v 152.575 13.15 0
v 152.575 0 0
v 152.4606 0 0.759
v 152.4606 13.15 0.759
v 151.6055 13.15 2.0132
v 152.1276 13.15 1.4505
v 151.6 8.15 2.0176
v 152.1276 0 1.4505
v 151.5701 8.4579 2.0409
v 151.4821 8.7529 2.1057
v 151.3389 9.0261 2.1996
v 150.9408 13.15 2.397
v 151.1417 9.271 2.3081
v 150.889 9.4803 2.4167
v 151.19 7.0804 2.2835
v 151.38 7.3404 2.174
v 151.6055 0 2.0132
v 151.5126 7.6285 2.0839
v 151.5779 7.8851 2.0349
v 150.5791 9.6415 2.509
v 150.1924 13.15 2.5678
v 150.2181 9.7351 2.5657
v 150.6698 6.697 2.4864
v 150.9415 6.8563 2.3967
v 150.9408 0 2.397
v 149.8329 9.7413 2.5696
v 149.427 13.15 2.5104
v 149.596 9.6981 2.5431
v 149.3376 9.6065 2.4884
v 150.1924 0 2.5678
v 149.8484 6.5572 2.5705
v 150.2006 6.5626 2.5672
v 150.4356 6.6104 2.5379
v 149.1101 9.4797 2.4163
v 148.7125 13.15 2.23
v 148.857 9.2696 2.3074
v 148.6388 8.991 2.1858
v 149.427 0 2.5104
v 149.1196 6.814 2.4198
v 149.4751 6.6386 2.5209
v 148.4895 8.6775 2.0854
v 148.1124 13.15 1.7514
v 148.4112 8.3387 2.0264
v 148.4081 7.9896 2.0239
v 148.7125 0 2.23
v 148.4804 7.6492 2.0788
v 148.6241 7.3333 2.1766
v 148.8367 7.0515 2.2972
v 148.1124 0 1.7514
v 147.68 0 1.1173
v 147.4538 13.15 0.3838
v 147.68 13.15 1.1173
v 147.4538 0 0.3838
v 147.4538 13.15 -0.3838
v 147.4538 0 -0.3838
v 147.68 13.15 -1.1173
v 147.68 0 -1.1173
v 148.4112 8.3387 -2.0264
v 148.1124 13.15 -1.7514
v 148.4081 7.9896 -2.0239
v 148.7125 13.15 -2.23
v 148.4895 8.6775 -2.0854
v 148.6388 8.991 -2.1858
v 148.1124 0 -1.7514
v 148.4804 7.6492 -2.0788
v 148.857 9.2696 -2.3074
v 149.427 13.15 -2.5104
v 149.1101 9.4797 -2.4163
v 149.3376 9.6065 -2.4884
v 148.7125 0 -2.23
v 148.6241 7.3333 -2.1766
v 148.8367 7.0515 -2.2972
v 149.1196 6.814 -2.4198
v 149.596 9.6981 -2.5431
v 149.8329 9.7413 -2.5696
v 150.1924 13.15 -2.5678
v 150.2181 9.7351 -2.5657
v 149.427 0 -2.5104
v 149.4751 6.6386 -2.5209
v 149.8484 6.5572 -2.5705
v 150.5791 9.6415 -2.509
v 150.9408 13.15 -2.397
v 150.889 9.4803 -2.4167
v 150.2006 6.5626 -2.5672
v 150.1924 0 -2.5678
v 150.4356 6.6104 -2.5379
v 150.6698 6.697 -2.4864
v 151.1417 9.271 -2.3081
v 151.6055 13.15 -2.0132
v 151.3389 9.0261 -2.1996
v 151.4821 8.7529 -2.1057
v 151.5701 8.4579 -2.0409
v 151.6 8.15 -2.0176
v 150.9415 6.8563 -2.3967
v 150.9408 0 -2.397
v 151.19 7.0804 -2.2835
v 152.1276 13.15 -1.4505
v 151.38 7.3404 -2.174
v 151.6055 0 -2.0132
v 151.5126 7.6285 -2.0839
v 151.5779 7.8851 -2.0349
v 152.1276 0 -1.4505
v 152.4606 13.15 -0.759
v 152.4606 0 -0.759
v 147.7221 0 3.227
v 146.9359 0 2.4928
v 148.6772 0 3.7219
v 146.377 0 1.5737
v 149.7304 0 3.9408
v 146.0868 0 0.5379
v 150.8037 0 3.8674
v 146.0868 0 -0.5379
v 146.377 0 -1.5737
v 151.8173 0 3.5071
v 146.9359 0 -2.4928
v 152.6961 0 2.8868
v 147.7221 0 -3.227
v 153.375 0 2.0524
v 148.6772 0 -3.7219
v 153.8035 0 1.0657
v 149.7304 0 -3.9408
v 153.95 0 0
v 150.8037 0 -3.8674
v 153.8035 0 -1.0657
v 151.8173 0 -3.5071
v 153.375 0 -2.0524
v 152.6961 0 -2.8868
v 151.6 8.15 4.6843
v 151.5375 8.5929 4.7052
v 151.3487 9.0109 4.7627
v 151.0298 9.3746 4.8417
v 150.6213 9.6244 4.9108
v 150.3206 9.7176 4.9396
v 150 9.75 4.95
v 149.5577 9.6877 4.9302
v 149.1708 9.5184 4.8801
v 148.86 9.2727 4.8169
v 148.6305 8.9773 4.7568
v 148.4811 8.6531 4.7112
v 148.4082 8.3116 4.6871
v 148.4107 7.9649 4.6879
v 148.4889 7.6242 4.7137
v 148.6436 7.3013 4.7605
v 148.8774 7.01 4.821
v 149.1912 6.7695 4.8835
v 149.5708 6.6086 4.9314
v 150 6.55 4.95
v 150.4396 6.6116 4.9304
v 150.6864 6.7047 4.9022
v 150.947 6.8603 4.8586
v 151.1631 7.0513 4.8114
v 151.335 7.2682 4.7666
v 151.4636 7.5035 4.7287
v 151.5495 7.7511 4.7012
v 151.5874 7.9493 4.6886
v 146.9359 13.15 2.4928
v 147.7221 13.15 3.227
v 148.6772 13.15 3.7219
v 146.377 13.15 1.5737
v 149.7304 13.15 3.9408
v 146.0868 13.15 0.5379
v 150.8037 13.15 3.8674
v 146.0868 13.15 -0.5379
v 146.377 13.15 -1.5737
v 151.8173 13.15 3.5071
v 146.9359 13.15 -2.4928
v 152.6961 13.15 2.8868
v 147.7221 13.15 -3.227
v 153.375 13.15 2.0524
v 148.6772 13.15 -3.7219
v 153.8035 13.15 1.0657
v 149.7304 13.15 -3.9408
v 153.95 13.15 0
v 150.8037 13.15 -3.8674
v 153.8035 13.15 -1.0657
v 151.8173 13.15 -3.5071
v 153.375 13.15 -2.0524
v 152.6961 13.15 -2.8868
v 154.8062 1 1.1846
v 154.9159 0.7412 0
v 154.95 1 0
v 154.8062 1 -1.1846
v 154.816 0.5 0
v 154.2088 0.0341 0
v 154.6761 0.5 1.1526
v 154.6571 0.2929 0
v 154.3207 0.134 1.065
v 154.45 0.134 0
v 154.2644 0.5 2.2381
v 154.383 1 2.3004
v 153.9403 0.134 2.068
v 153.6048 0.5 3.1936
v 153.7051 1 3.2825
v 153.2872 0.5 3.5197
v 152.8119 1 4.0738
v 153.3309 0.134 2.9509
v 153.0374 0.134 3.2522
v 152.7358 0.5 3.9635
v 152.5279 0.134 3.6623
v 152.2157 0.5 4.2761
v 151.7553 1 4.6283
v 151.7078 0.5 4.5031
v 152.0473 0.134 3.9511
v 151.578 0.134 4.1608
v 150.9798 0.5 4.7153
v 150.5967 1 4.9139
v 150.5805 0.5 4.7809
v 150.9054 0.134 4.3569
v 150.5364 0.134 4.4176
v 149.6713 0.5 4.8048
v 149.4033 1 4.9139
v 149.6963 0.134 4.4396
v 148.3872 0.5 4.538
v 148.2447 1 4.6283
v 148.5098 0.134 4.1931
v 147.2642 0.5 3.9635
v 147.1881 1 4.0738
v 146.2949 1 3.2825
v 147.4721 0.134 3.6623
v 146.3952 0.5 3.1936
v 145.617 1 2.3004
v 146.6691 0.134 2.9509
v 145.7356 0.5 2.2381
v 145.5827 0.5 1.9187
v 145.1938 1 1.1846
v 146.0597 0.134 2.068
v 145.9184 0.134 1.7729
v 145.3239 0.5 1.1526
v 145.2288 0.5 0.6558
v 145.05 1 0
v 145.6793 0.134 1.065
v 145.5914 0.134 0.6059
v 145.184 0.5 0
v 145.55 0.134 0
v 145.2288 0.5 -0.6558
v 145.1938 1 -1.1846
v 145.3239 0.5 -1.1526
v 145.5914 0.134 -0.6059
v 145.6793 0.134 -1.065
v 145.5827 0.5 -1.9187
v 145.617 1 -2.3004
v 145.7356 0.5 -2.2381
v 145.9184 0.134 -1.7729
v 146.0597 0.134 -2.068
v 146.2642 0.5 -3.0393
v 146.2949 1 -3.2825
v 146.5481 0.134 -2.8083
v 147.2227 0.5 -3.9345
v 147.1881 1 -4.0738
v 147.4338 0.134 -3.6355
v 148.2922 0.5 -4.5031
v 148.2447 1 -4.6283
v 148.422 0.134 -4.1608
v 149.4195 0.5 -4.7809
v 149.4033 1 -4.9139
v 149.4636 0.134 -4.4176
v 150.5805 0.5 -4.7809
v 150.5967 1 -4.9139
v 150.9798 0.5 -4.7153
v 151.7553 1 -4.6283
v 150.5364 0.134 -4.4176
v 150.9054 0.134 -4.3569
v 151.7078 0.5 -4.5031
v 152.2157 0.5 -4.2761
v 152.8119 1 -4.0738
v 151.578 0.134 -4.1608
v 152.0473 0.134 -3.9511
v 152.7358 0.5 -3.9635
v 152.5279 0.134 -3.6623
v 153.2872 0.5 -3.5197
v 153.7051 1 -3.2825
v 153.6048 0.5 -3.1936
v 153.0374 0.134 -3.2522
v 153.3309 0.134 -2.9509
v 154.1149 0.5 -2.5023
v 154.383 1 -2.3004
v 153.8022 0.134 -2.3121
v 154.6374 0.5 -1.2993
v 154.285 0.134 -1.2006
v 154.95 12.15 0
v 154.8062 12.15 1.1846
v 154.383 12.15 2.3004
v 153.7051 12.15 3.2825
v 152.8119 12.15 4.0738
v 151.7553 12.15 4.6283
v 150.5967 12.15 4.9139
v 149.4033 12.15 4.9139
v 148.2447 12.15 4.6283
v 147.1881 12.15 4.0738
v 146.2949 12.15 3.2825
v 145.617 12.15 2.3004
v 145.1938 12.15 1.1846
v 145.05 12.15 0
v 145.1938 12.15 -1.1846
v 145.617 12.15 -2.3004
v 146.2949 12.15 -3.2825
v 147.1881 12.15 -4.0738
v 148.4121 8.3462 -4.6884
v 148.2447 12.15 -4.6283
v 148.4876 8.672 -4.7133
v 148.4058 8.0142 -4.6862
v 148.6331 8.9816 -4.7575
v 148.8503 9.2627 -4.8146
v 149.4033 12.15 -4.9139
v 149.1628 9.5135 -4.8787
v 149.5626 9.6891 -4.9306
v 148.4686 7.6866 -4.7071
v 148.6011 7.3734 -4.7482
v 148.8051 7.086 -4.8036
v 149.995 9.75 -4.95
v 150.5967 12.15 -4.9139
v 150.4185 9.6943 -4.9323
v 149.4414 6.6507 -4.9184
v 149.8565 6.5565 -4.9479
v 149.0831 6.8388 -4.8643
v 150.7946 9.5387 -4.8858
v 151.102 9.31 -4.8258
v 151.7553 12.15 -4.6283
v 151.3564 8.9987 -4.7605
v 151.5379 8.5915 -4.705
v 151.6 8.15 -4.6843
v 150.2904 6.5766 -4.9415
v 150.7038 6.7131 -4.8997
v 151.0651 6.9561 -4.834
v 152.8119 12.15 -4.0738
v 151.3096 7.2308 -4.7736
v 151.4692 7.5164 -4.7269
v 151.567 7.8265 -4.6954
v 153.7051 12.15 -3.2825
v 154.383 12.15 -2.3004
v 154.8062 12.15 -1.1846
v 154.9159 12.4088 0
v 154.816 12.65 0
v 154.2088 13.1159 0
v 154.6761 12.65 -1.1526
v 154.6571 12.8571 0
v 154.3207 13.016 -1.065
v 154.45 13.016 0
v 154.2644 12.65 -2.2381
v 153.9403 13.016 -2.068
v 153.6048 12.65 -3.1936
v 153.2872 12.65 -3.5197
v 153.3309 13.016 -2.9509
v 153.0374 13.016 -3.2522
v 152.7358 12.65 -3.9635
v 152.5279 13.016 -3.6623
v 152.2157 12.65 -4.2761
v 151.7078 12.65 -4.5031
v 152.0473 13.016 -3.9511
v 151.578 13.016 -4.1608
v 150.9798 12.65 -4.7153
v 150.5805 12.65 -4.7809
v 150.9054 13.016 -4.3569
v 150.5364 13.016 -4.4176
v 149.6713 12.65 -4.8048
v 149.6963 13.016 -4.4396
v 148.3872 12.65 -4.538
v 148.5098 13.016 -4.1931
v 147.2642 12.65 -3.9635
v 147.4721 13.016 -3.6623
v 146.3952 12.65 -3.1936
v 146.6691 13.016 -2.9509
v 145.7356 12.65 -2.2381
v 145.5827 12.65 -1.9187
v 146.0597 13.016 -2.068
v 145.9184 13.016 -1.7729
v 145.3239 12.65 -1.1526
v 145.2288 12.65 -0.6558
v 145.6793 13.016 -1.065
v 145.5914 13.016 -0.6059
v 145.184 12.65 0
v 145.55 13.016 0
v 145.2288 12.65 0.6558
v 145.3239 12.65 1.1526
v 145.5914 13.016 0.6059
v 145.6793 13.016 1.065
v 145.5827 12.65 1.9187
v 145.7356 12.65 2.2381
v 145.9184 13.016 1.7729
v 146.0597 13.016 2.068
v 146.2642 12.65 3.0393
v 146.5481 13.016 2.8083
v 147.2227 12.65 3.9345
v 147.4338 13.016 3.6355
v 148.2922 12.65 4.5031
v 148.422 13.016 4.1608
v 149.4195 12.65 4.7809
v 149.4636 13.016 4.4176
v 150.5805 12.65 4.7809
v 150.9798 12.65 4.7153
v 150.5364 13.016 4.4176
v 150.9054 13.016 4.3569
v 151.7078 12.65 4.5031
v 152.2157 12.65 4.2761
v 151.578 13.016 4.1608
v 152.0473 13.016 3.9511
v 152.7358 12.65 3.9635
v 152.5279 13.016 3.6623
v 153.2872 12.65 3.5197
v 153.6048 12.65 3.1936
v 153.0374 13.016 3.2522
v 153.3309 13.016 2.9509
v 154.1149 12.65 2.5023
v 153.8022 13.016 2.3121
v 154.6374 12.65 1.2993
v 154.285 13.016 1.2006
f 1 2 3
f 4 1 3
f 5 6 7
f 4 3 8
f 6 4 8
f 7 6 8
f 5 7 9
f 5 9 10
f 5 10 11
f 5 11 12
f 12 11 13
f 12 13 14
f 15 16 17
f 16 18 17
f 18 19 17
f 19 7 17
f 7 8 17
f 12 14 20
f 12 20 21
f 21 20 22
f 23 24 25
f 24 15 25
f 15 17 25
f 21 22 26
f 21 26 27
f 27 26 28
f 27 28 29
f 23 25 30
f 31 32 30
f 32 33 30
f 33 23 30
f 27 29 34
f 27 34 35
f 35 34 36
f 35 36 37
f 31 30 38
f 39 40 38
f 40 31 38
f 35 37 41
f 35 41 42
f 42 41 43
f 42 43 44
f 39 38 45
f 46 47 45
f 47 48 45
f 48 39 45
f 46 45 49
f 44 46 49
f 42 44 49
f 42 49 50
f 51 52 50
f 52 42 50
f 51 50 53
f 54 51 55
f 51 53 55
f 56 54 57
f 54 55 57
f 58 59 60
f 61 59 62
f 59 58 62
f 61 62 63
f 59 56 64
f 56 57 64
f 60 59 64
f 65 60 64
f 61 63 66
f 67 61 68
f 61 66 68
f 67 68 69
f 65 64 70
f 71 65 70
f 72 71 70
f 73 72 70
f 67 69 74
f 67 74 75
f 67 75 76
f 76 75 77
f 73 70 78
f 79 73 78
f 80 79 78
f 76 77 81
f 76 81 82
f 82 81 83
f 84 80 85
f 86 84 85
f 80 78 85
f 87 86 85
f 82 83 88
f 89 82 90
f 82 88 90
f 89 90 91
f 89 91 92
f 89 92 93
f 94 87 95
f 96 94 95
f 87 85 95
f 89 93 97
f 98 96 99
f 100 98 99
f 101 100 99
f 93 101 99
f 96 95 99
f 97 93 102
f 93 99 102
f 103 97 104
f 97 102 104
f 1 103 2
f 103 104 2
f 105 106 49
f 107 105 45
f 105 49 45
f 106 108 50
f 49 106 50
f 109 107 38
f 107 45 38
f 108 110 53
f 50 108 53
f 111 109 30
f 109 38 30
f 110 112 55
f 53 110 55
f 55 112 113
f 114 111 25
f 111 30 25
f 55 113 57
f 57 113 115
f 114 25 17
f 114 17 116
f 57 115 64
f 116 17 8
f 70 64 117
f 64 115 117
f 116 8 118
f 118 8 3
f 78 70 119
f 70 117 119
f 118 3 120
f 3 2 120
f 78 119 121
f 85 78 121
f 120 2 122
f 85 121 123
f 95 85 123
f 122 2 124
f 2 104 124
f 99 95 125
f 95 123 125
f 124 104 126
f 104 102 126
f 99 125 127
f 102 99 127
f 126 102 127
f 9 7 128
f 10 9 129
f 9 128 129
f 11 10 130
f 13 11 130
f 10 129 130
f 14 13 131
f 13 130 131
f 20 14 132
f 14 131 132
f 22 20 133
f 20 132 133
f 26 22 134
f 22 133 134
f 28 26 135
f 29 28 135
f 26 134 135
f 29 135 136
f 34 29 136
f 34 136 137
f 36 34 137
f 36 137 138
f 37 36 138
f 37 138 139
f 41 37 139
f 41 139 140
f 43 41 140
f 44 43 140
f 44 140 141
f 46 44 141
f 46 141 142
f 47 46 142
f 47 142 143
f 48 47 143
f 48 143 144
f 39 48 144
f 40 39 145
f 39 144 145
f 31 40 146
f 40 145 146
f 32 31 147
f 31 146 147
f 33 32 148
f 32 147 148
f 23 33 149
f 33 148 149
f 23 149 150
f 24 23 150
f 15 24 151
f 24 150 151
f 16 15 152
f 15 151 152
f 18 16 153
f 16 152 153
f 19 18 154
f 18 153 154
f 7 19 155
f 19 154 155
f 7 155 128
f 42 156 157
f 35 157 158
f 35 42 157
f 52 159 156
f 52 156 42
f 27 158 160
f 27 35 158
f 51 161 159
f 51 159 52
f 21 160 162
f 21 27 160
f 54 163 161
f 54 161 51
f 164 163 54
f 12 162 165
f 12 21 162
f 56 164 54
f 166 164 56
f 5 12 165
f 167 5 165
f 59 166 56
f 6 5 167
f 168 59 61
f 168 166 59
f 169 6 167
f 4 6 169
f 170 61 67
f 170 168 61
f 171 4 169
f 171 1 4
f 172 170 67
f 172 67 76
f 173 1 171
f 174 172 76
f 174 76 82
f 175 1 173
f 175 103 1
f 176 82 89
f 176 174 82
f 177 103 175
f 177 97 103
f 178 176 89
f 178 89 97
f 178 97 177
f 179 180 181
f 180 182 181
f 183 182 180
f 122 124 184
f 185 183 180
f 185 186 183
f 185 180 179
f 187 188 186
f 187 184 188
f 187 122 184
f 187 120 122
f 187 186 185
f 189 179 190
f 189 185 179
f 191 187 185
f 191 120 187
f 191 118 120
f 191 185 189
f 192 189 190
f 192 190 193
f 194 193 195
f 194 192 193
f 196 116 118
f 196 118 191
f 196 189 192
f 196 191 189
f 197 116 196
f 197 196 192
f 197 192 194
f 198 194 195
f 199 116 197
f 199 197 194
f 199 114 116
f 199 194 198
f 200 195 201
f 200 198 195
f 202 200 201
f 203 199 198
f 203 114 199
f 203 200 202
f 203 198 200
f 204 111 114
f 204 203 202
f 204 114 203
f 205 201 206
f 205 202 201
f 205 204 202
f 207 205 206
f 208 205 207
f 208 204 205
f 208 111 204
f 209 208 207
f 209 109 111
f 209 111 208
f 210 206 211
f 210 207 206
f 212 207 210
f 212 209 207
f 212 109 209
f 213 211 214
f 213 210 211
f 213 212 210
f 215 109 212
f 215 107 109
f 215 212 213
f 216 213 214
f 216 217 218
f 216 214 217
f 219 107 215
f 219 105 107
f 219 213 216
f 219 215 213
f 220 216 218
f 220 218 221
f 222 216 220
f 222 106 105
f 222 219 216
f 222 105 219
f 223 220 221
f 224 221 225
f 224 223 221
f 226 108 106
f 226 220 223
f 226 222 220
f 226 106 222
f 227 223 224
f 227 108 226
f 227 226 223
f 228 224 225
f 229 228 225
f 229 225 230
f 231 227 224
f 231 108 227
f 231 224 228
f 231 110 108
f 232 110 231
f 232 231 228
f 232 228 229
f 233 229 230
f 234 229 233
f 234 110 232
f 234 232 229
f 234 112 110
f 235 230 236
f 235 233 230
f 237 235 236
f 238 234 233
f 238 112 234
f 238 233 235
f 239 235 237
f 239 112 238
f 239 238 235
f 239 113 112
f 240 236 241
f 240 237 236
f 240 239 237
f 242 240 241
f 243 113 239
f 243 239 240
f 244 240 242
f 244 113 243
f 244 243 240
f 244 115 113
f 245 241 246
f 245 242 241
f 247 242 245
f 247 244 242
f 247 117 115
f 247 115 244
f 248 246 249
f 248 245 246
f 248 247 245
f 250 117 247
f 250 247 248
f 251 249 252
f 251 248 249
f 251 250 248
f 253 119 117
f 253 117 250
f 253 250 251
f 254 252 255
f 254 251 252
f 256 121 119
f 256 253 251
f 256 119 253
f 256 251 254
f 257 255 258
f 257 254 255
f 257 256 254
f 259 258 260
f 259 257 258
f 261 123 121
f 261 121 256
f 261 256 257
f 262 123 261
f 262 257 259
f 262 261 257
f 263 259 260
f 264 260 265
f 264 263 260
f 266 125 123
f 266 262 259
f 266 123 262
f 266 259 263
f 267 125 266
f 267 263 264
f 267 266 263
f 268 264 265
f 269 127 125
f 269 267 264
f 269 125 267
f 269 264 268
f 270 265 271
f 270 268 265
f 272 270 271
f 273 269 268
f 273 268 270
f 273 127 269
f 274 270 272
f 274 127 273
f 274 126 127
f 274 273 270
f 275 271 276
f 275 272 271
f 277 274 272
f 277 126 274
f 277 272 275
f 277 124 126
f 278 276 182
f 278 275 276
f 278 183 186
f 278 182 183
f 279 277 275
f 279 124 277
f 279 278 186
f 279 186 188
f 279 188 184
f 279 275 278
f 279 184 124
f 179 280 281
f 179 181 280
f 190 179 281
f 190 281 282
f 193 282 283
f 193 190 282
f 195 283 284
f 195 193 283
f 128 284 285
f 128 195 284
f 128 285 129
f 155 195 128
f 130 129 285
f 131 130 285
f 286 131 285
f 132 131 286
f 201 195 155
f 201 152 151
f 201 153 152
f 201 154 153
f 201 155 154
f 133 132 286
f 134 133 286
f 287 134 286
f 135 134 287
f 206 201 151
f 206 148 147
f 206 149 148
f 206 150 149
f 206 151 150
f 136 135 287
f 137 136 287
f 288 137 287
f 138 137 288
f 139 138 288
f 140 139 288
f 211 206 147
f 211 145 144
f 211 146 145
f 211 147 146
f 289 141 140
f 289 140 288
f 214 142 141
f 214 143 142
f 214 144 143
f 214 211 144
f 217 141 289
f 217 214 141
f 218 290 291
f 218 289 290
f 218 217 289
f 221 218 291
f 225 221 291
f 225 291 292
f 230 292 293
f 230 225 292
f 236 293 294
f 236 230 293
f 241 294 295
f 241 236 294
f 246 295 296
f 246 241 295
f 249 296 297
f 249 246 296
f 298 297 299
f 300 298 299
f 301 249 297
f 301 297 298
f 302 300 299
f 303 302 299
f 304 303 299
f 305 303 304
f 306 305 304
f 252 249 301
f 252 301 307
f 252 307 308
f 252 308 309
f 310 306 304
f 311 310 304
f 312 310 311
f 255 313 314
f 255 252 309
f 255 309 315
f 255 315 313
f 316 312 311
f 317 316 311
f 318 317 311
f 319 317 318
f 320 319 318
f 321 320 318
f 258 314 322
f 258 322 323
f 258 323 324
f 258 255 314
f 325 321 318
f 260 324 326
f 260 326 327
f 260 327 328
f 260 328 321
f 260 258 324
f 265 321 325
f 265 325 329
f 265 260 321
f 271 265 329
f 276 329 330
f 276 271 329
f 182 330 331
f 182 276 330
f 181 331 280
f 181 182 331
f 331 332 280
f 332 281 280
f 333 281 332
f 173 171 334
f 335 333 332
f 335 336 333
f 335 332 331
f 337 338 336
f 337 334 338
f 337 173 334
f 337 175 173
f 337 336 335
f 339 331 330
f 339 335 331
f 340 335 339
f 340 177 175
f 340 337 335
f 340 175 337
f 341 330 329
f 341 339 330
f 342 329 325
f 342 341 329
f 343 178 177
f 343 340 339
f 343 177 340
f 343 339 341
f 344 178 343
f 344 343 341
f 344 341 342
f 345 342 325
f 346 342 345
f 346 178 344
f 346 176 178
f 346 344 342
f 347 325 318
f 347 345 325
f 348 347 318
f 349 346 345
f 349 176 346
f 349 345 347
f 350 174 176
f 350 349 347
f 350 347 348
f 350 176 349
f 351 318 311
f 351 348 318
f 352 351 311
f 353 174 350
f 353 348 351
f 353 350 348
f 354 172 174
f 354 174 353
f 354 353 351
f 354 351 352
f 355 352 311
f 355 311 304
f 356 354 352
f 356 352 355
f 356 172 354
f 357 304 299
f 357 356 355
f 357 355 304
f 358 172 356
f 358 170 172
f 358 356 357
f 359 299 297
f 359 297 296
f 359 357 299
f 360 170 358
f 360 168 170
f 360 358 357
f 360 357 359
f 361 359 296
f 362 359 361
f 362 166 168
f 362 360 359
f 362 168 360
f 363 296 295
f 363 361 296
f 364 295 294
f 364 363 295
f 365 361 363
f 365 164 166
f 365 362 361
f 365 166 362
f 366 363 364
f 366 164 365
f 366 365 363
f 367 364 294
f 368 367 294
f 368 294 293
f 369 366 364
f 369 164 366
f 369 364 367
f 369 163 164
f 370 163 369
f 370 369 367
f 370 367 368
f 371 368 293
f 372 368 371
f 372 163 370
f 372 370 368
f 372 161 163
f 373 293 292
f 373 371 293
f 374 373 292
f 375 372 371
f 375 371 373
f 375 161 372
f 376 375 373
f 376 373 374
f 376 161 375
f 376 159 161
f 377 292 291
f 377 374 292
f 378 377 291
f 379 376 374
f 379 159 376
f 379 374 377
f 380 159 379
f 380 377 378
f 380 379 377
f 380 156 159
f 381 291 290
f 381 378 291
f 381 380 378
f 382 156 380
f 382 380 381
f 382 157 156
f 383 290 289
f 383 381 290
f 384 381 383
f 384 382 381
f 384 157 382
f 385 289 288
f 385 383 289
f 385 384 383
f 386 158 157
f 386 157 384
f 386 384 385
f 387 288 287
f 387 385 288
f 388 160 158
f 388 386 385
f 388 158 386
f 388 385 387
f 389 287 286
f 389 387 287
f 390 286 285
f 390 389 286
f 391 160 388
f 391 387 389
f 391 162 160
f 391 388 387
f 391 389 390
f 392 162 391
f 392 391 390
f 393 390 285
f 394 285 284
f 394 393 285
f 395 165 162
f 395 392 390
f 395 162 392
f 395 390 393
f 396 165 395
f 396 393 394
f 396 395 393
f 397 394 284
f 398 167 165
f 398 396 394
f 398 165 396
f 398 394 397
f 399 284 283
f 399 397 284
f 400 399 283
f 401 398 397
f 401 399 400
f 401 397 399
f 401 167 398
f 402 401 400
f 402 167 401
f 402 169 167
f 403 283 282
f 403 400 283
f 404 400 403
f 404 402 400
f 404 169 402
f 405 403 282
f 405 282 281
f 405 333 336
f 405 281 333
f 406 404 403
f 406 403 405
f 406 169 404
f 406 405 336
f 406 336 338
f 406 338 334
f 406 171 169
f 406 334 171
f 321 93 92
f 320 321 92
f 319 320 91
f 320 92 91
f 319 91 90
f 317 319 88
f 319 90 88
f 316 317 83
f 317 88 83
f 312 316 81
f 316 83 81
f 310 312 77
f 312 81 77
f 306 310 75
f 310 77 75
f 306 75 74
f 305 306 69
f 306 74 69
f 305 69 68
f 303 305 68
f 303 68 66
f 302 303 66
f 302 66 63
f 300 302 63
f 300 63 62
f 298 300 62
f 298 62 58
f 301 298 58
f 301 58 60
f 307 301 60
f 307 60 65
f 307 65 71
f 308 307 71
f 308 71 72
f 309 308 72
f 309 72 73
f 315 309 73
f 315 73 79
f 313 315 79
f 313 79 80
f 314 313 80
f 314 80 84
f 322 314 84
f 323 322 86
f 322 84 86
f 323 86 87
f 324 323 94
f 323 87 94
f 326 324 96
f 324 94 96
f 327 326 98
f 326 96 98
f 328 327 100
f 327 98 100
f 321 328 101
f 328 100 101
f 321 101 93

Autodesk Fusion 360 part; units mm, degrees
sketch "Sketch1" plane through (0, 0, 0) normal (0, 1, 0) x (1, 0, 0)
  circle A0 centre (150, 0) radius 4.95
  circle A1 centre (150, 0) radius 2.575
  dimension "d1" = 9.9
  dimension "d2" = 5.15
extrude "Extrude1" add sketch "Sketch1" along normal blind 13.15
ref_plane "WorkPlane1" through (150, 7.9424, 4.95) normal (0, 0, 1) x (-1, 0, 0)
sketch "Sketch2" plane through (0, 0, 4.95) normal (0, 0, 1) x (1, 0, 0)
  line L0 (154.95, 13.15) -> (145.05, 13.15) construction
  line L1 (154.95, 0) -> (145.05, 0) construction
  line L2 (150, 13.15) -> (150, 0) construction
  circle A0 centre (150, 8.15) radius 1.6
  dimension "d6" = 3.2
  dimension "d7" = 5
extrude "Extrude2" cut sketch "Sketch2" against normal blind 16
fillet "Fillet1" radius 1 2 edges at (145.385, 13.15, 1.79) (145.385, 0, 1.79)
